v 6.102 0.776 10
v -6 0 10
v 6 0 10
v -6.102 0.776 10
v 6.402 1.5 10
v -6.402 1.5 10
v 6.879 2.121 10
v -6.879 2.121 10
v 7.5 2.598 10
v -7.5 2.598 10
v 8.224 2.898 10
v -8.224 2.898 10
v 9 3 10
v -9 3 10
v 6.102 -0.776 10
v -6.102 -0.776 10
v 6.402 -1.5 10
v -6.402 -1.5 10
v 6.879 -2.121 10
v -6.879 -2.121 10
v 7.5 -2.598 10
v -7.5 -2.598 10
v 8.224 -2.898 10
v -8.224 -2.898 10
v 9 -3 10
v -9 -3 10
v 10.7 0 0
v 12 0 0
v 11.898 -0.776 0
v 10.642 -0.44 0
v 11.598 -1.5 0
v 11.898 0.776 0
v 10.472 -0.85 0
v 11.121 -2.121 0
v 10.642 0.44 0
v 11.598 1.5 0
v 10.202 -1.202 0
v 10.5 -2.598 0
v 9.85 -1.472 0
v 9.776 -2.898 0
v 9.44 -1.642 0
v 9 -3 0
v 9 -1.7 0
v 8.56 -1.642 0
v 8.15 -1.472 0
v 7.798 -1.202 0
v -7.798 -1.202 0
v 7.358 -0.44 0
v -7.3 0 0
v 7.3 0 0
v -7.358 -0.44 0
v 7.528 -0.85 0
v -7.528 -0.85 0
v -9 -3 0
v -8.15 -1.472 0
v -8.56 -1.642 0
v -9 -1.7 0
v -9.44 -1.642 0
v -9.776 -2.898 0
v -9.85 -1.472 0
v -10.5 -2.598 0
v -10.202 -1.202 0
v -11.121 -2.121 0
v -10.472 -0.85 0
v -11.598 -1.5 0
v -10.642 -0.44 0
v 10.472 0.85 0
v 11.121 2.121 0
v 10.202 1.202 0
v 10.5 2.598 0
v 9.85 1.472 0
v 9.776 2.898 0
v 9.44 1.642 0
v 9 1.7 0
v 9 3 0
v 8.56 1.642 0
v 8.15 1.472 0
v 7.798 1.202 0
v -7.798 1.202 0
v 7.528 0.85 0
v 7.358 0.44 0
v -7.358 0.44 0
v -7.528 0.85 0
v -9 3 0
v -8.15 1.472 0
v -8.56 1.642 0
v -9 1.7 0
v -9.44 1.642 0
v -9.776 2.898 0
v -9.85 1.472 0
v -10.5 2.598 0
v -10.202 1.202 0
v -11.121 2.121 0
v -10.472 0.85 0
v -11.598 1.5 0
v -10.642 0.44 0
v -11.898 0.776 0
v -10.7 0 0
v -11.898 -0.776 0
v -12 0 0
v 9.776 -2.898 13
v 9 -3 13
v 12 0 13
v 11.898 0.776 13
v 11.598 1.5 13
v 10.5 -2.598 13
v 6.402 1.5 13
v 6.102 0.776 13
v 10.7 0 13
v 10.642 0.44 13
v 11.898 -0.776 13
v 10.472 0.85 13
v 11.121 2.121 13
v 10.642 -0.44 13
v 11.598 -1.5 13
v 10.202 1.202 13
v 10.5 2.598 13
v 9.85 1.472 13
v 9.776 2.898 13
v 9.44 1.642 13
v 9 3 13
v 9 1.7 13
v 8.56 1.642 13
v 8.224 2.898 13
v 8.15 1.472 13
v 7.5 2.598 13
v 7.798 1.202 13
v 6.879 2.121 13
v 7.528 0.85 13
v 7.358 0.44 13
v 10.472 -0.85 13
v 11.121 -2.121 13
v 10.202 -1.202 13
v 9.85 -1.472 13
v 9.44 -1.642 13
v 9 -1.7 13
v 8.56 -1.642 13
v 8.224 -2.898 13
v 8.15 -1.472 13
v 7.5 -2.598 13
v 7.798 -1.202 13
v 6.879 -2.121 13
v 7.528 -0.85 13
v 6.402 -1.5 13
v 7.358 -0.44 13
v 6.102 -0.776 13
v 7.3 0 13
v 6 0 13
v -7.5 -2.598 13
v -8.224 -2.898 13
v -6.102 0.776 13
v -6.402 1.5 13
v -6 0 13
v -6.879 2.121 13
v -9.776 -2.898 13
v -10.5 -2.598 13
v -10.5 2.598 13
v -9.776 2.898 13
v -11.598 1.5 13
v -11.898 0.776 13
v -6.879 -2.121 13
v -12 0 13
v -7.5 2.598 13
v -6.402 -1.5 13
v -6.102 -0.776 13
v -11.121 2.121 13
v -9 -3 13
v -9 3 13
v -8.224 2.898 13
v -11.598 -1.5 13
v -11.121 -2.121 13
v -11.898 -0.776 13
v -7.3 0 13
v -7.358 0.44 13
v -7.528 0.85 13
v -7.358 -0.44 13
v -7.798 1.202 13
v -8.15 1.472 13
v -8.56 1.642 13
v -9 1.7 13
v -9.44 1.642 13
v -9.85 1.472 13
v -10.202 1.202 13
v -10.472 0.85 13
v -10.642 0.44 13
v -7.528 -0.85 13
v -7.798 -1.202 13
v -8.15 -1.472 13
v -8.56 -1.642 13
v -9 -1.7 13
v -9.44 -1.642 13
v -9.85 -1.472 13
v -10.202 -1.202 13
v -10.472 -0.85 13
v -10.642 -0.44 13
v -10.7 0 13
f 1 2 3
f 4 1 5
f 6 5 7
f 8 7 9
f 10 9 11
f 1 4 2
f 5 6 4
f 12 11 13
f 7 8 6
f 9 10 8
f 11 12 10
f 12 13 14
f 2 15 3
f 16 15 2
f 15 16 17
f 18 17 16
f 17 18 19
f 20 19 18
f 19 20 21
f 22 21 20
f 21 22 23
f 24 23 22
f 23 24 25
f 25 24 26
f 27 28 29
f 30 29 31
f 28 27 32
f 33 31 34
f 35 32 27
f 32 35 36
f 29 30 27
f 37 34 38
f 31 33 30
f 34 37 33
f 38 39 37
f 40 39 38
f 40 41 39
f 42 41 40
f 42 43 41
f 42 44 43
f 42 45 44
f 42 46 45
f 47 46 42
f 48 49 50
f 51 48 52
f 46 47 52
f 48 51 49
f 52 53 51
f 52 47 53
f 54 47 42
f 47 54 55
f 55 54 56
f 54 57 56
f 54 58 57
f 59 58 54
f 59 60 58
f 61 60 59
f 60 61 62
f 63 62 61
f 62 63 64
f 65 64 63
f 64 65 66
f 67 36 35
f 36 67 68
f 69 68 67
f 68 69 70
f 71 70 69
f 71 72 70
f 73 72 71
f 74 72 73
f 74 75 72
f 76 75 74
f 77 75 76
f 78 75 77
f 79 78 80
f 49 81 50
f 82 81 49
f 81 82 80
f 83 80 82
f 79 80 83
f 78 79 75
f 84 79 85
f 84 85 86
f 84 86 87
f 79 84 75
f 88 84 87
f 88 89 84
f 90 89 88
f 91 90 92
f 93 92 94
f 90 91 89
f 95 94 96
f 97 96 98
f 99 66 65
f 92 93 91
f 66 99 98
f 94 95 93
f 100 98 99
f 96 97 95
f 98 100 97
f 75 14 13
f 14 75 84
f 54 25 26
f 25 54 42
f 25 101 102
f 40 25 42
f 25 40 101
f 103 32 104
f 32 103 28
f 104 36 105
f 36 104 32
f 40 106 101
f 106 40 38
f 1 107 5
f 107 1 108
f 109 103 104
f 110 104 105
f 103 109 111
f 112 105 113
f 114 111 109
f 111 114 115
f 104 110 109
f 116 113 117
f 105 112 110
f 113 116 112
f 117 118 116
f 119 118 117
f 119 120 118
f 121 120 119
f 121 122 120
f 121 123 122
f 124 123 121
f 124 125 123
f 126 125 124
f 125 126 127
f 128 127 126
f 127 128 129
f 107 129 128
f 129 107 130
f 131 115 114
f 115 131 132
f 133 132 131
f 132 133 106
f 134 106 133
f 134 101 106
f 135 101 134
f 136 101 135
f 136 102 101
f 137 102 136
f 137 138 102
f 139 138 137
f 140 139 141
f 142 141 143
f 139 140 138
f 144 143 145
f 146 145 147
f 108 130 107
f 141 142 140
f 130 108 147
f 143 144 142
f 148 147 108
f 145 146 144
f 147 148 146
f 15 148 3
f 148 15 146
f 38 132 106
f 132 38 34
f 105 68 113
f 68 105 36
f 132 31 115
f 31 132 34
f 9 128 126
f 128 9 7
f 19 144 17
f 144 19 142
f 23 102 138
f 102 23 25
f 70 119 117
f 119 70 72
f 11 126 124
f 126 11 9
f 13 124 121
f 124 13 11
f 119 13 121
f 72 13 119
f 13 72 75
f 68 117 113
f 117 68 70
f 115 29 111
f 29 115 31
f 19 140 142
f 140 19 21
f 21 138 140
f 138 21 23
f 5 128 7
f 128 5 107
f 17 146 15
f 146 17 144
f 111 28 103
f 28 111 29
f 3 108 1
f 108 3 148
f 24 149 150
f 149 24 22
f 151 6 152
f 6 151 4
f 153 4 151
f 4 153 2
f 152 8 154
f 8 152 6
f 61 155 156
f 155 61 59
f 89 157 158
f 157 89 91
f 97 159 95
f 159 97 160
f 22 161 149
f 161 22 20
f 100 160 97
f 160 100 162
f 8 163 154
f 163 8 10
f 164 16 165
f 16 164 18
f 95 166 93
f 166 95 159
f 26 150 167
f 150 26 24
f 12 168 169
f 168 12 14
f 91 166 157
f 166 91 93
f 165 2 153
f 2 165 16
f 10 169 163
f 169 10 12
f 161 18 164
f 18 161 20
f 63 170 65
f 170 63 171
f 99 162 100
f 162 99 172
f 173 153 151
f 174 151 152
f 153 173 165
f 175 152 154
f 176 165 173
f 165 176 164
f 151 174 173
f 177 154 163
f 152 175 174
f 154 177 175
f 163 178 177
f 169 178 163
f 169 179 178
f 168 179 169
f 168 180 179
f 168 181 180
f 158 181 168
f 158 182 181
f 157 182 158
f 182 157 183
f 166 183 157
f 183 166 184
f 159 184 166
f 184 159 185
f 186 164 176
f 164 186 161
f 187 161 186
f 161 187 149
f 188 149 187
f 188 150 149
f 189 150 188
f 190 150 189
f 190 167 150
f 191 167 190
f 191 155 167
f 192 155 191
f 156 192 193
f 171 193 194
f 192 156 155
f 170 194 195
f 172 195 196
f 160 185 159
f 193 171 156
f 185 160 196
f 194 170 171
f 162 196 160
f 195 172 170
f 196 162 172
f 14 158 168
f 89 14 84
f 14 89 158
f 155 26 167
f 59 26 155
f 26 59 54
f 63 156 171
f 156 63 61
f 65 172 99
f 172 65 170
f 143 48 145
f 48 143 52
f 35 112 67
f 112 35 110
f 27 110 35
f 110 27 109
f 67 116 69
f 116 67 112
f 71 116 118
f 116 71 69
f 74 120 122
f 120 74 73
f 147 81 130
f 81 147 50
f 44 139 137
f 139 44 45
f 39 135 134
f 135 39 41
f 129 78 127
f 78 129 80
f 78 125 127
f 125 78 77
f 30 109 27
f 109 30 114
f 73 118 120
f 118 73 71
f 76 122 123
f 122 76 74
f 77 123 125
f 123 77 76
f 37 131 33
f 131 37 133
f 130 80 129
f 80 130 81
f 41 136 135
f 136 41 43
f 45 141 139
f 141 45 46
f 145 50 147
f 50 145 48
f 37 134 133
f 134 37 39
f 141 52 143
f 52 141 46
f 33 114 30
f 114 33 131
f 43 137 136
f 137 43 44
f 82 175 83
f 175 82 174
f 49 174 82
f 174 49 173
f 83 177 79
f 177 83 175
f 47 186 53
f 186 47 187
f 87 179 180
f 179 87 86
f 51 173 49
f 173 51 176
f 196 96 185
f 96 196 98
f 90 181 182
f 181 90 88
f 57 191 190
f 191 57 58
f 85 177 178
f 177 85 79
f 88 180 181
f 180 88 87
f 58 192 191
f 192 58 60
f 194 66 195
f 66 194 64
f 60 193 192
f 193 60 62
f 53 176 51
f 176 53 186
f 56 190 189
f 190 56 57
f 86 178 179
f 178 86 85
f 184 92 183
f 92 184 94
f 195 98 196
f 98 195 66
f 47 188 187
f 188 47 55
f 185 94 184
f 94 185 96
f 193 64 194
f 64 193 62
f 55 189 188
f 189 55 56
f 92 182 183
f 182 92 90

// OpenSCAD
// Cuttlefish supporter 3D Design

// Copyright (c) 2014 by Jeremy Bennett <jeremy.bennett@embecosm.com>

// Licensed under a Creative Commons Attribution-ShareAlike 3.0 Unported
// License.

// You should have received a copy of the license along with this work.  If not,
// see <http://creativecommons.org/licenses/by-sa/3.0/>.

// -----------------------------------------------------------------------------

// The main block
module main_block () {
	union () {
 		translate (v = [0, 0, 5])
			cube (size = [18, 6, 10], center = true);
		translate (v = [18 / 2, 0, 13 / 2])
			cylinder (r = 3, h = 13, center = true, $fn = 24);
 		translate (v = [-18 / 2, 0, 13 / 2])
			cylinder (r = 3, h = 13, center = true, $fn = 24);
	}
}


// The support
module cuttlefish_support () {
	difference () {
		main_block ();
		translate (v = [18 / 2, 0, 13 / 2])
			cylinder (r = 1.7, h = 13.5, center = true, $fn = 24);
		translate (v = [-18 / 2, 0, 13 / 2])
			cylinder (r = 1.7, h = 13.5, center = true, $fn = 24);
	}
}

cuttlefish_support ();
